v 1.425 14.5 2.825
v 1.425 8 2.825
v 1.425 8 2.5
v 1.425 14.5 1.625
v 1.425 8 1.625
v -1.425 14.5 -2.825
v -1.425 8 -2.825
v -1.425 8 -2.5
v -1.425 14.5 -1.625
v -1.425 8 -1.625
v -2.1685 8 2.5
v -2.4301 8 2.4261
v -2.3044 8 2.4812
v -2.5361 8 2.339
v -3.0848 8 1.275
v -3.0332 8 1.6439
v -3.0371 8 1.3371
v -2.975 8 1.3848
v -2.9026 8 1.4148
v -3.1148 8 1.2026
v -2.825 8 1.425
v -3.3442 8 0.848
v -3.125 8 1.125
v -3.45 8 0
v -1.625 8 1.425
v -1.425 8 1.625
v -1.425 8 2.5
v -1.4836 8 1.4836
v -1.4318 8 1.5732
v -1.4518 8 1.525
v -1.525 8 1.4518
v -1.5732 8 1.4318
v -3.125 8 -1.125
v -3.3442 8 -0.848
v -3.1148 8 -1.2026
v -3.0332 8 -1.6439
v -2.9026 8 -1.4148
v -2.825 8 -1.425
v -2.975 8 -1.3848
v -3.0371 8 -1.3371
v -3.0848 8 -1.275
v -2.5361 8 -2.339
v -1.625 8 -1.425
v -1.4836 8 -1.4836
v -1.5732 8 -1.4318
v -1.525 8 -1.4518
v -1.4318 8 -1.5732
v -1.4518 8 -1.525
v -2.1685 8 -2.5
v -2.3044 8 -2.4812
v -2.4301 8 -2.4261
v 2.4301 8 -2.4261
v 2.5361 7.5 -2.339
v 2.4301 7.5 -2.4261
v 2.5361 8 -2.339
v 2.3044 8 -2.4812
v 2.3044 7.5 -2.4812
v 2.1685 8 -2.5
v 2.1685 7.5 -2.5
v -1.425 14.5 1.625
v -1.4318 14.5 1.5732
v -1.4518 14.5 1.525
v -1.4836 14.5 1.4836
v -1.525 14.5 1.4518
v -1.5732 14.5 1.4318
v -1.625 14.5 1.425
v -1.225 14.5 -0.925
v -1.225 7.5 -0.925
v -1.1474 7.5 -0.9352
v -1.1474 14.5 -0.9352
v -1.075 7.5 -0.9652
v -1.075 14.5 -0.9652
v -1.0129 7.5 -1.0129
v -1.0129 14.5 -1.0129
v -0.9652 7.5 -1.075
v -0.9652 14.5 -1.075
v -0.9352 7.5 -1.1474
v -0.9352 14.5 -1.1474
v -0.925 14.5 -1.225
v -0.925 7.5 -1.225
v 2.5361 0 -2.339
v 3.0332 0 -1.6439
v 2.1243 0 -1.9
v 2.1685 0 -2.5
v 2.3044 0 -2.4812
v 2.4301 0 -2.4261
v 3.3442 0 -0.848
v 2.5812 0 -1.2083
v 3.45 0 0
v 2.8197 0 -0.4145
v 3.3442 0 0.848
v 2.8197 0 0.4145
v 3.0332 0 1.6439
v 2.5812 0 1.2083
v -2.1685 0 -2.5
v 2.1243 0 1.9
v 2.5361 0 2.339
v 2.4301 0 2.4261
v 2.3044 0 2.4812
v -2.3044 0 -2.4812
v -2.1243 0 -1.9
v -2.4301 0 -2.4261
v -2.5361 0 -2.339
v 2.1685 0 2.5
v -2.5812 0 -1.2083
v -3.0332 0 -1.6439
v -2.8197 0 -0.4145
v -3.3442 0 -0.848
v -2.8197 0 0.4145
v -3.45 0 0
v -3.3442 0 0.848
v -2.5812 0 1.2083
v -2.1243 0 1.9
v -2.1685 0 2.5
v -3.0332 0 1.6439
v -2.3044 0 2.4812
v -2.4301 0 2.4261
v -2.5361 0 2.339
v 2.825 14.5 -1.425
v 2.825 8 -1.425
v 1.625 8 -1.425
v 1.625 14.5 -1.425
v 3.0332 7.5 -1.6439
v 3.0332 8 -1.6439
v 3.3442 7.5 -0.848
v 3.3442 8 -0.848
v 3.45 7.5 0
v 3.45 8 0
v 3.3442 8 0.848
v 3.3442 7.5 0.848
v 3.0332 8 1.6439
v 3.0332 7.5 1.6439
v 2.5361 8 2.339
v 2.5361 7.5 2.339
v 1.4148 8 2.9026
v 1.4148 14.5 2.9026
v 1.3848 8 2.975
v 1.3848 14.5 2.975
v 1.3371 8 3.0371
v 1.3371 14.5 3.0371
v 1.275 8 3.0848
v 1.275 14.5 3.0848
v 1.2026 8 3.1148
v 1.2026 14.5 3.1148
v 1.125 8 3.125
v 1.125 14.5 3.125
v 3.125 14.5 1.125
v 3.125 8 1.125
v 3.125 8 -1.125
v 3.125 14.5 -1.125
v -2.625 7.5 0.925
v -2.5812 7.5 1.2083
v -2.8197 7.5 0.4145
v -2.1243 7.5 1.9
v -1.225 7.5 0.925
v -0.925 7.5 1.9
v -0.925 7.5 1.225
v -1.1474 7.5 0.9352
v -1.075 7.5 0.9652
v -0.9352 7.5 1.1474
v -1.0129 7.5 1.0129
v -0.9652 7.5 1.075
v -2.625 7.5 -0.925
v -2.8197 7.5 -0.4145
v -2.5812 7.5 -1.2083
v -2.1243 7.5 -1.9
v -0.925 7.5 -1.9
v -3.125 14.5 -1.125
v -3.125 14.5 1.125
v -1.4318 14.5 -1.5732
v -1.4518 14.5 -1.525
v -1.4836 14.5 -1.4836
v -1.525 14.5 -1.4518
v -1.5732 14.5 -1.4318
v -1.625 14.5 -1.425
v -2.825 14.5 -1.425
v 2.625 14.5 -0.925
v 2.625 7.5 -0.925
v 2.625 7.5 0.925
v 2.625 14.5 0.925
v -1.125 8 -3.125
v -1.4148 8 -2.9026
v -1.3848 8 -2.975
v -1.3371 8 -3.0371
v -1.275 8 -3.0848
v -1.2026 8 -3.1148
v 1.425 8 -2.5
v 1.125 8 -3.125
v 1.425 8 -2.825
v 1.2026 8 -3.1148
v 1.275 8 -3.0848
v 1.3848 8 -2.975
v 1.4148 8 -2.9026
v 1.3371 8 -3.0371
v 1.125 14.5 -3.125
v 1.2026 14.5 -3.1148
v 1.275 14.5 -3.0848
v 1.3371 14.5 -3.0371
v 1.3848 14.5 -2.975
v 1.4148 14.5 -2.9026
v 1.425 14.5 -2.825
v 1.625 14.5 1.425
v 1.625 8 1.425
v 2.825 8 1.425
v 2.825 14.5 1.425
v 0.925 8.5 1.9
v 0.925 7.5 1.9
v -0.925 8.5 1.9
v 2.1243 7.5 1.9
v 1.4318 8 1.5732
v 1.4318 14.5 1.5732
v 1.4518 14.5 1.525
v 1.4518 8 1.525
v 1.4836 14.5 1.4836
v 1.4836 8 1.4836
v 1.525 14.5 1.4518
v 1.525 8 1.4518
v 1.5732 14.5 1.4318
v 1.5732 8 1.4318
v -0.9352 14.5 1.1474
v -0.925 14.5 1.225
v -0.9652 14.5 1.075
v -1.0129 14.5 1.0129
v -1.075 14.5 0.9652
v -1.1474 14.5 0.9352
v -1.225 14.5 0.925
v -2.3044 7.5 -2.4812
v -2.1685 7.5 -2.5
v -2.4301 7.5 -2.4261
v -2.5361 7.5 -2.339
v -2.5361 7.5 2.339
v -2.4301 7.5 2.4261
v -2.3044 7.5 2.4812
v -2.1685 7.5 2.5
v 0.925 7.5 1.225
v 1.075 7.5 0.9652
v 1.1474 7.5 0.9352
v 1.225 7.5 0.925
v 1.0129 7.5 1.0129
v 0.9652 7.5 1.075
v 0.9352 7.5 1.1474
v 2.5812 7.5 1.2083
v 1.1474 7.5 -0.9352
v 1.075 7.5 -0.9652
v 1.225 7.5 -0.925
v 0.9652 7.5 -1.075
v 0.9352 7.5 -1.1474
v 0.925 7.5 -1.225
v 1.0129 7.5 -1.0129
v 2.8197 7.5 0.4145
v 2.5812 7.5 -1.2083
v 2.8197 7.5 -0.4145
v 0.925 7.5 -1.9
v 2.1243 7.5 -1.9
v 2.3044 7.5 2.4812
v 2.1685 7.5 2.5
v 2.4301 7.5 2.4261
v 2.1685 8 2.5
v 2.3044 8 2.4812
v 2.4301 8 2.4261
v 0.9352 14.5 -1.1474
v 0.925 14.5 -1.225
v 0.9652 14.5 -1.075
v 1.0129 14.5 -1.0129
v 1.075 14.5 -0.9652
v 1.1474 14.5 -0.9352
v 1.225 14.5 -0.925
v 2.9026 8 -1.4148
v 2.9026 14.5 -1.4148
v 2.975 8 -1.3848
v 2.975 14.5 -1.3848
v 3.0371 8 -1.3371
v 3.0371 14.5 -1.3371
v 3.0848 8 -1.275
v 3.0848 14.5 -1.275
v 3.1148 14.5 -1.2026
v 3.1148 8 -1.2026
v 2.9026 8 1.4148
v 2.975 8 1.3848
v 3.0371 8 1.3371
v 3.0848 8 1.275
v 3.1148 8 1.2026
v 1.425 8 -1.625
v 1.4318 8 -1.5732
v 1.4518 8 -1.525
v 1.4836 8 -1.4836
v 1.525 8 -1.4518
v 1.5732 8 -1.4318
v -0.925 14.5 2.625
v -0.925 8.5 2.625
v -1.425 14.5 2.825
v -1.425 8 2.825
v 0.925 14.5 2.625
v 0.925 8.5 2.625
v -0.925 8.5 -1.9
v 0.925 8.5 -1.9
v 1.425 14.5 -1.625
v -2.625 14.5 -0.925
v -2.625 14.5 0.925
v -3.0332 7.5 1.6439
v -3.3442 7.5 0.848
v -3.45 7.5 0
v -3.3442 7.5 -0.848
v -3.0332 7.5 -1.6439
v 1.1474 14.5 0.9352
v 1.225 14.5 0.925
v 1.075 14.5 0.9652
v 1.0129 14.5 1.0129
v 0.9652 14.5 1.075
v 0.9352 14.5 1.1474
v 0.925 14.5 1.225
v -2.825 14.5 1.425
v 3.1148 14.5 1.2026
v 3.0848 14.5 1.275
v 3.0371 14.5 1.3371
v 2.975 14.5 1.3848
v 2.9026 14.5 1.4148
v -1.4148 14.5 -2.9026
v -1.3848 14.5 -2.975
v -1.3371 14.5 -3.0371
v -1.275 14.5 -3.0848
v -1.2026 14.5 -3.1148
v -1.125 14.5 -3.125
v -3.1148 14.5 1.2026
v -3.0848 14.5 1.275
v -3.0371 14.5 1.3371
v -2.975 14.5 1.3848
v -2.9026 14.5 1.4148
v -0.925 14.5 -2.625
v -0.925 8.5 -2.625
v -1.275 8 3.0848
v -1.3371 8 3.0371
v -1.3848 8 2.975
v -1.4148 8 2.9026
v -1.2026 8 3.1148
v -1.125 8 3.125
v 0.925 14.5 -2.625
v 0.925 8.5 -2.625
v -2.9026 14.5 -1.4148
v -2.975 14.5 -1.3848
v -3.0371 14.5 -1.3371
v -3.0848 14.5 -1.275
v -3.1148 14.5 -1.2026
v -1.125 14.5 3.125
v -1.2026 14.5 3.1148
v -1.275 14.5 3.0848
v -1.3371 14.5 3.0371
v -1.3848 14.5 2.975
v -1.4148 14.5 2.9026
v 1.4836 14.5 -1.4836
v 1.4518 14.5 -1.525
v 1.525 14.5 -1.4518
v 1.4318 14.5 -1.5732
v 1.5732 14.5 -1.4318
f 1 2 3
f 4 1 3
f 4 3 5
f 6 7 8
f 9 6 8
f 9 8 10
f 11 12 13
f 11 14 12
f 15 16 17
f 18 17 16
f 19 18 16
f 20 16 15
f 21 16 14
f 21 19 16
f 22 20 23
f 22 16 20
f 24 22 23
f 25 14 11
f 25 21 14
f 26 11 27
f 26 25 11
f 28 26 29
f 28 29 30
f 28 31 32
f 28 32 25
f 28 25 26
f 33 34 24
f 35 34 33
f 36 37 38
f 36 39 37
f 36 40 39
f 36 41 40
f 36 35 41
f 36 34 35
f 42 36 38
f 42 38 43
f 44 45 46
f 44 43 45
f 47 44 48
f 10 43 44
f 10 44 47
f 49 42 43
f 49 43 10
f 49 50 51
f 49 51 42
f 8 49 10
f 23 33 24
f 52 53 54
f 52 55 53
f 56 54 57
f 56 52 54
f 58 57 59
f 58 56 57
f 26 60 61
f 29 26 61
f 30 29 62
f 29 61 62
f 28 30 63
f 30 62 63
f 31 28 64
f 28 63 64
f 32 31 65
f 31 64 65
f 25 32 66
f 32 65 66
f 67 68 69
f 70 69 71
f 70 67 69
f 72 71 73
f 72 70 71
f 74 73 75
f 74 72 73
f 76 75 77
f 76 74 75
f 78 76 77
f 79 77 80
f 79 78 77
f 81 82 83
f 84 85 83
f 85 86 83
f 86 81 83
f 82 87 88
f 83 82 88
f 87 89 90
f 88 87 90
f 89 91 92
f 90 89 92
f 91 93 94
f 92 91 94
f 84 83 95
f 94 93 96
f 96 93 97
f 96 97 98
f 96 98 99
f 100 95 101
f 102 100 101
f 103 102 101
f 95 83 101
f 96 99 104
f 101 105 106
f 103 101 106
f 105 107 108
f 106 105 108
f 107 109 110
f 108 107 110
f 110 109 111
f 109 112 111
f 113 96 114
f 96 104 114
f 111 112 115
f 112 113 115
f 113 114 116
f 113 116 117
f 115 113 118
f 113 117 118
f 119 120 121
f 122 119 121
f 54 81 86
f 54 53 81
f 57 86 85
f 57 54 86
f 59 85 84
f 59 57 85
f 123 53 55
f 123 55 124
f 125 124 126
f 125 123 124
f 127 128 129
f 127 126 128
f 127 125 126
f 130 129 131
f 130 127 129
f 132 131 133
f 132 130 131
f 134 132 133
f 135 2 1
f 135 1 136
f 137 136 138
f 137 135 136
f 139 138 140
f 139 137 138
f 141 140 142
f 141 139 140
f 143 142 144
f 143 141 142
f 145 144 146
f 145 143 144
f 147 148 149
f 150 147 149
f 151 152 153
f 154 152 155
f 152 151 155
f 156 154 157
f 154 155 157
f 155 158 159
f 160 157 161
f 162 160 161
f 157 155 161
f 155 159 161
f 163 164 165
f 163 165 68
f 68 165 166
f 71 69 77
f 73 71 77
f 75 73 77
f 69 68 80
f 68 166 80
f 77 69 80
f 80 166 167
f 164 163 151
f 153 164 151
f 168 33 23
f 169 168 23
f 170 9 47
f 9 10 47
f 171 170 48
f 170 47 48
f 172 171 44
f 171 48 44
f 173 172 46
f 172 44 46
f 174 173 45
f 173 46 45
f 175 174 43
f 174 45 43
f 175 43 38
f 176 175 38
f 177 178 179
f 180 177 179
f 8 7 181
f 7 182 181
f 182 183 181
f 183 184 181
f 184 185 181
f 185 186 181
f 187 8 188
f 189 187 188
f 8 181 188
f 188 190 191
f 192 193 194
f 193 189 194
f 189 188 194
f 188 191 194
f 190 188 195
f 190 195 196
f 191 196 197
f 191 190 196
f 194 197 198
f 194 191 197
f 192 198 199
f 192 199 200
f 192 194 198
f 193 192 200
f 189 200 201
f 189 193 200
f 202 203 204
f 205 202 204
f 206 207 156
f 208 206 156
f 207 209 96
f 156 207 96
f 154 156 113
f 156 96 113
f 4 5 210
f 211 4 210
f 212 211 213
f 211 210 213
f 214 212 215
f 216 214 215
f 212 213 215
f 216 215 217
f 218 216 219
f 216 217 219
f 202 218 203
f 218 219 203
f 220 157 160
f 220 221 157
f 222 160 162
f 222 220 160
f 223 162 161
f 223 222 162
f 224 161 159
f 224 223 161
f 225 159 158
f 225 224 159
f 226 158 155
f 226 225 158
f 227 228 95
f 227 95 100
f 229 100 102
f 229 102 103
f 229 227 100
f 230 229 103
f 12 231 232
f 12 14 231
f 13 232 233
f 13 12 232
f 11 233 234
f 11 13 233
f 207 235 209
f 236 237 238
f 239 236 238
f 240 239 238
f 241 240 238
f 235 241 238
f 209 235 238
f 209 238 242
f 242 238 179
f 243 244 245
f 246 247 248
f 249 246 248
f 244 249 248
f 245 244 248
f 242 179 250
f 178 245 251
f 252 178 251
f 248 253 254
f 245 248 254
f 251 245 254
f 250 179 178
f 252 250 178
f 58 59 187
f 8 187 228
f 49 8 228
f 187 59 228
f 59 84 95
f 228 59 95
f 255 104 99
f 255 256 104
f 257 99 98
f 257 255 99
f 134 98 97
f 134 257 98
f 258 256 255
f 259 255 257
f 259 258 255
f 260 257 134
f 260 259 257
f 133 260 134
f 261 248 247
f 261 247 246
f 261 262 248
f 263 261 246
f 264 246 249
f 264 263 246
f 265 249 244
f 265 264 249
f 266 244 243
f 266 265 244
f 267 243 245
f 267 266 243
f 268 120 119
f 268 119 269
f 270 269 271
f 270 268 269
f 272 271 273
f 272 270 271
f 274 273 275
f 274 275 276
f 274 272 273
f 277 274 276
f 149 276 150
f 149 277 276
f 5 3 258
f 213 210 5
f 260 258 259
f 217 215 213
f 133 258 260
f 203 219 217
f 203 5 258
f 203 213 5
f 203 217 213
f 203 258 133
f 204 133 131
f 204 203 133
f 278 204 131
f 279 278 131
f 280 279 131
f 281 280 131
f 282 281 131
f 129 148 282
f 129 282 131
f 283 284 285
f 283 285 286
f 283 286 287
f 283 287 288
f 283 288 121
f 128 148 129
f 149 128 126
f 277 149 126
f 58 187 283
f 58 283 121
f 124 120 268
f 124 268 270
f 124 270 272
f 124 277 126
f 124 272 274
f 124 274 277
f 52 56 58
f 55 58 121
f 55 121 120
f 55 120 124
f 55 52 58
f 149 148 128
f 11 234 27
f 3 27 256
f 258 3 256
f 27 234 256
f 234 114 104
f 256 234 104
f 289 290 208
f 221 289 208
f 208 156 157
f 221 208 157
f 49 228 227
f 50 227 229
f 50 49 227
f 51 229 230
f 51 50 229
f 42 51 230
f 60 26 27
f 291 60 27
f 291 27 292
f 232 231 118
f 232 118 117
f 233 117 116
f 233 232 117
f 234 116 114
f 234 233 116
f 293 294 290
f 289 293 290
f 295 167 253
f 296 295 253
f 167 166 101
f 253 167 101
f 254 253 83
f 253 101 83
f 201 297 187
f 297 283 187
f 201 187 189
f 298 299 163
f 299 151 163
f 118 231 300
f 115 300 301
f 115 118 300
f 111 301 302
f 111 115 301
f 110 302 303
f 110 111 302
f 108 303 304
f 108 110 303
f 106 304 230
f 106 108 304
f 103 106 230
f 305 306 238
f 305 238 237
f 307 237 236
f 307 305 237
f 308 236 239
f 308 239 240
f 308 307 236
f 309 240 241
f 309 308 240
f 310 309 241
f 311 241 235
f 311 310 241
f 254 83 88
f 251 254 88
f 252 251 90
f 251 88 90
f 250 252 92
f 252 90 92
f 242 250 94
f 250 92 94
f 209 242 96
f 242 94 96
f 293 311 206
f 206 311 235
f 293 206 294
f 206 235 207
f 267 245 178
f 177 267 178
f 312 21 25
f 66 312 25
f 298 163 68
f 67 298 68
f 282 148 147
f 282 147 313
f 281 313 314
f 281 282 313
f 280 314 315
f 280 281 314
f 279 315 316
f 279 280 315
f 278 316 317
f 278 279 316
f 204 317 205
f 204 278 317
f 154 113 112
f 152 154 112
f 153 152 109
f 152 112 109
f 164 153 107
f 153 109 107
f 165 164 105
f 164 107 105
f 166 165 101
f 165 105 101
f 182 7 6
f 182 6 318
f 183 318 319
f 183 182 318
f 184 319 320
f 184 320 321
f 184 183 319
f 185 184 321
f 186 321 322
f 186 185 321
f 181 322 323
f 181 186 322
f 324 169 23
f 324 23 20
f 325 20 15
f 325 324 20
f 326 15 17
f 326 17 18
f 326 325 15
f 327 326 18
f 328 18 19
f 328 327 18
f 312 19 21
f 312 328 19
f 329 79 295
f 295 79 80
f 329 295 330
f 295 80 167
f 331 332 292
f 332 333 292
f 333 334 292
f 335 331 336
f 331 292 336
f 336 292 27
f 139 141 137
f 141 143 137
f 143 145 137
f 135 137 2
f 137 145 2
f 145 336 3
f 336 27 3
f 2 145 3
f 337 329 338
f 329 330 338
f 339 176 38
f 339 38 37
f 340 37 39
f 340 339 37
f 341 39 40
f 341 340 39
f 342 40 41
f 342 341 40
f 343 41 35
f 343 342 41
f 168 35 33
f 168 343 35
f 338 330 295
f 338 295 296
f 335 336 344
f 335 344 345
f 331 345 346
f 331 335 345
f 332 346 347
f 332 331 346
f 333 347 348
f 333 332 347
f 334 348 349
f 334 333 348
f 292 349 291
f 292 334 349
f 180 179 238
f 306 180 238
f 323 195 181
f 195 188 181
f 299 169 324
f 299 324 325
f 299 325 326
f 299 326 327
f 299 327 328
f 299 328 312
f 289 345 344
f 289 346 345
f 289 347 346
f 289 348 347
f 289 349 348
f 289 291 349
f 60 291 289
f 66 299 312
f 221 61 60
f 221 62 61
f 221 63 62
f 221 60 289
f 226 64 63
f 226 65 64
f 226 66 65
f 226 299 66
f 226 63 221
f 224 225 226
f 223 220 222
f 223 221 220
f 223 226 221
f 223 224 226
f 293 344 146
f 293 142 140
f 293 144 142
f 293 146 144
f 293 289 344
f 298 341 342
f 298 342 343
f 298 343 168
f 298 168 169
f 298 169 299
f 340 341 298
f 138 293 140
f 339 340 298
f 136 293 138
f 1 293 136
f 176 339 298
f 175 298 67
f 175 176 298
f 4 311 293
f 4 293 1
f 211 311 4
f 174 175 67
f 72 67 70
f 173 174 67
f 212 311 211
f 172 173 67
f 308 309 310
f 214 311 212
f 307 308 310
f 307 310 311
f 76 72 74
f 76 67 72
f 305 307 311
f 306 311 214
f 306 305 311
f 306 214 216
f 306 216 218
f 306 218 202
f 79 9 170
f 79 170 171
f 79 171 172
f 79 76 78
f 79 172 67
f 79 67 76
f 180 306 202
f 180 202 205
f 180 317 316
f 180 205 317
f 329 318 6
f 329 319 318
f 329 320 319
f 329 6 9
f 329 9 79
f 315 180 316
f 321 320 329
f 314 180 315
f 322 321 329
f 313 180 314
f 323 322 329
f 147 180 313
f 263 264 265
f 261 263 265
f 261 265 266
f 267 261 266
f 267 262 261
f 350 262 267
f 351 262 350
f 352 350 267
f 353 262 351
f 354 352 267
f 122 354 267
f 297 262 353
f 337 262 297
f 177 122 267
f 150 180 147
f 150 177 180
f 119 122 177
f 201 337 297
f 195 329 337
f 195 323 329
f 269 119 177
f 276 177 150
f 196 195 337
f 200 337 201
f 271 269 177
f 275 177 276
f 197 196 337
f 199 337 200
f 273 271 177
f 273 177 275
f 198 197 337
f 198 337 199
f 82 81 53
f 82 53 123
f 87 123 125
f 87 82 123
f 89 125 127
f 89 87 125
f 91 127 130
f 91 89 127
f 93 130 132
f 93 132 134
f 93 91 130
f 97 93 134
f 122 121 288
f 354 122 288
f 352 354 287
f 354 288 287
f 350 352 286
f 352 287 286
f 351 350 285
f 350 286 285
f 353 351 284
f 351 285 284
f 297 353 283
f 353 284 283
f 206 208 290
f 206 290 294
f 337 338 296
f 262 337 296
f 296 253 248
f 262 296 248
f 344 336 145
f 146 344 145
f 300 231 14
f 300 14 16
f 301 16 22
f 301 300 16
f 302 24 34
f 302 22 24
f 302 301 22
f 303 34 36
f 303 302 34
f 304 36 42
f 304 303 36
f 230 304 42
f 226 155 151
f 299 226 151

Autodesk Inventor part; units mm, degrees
ref_plane "YZ Plane" through (0, 0, 0) normal (1, 0, 0) x (0, 1, 0)
ref_plane "XZ Plane" through (0, 0, 0) normal (0, 1, 0) x (-1, 0, 0)
ref_plane "XY Plane" through (0, 0, 0) normal (0, 0, 1) x (1, 0, 0)
sketch "Sketch1" plane through (0, 0, 0) normal (0, 1, 0) x (-1, 0, 0)
  line L0 (-2.85, 1.9) -> (2.85, 1.9)
  line L1 (2.85, 1.9) -> (2.85, -1.9)
  line L2 (2.85, -1.9) -> (-2.85, -1.9)
  line L3 (-2.85, -1.9) -> (-2.85, 1.9)
  line L4 (-2.85, 1.9) -> (2.85, -1.9) construction
  line L5 (2.85, 1.9) -> (-2.85, -1.9) construction
  line L6 (3.45, -2.5) -> (3.45, 2.5)
  line L7 (3.45, 2.5) -> (-3.45, 2.5)
  line L8 (-3.45, 2.5) -> (-3.45, -2.5)
  line L9 (-3.45, -2.5) -> (3.45, -2.5)
  circle A0 centre (0, 0) radius 2.85
  circle A1 centre (0, 0) radius 3.45
  point P0 (-2.1243, 1.9)
  point P1 (2.1243, 1.9)
  point P2 (2.1243, -1.9)
  point P3 (-2.1243, -1.9)
  point P4 (-2.3775, 2.5)
  point P5 (-2.3775, -2.5)
  point P6 (2.3775, -2.5)
  point P7 (2.3775, 2.5)
  dimension "d0" = 3.8
  dimension "d1" = 0.6
  dimension "d2" = 5.7
extrude "Extrusion1" add sketch "Sketch1" along normal blind 7.5 contours L3 L2 A0 L9 A1 L7 L0 | L0 A0 L3 | A0 L7 L0 | A0 L2 L3 | A0 L7 A1 L9 L2 L1 L0 | L0 L1 A0 | L2 A0 L9 | L1 L2 A0
sketch "Sketch2" plane through (0, 7.5, 0) normal (0, 1, 0) x (1, 0, 0)
  arc A0 (2.3775, -2.5) -> (2.3775, 2.5) centre (0, 0) ccw projected
  line L0 (2.3775, 2.5) -> (-2.3775, 2.5) projected
  arc A1 (-2.3775, 2.5) -> (-2.3775, -2.5) centre (0, 0) ccw projected
  line L1 (-2.3775, -2.5) -> (2.3775, -2.5) projected
  arc A2 (2.1243, -1.9) -> (2.1243, 1.9) centre (0, 0) ccw projected
  line L2 (2.1243, -1.9) -> (-2.1243, -1.9) projected
  arc A3 (-2.1243, 1.9) -> (-2.1243, -1.9) centre (0, 0) ccw projected
  line L3 (-2.1243, 1.9) -> (2.1243, 1.9) projected
extrude "Extrusion2" add sketch "Sketch2" along normal blind 0.5 contours L1 A1 L0 A0 | L2 A3 L3 A2
sketch "Sketch3" plane through (0, 8, 0) normal (0, 1, 0) x (1, 0, 0)
  line L0 (-0.925, -2.625) -> (-0.925, 2.625)
  line L1 (-0.925, 2.625) -> (0.925, 2.625)
  line L2 (0.925, 2.625) -> (0.925, -2.625)
  line L3 (0.925, -2.625) -> (-0.925, -2.625)
  line L4 (-0.925, -2.625) -> (0.925, 2.625) construction
  line L5 (-0.925, 2.625) -> (0.925, -2.625) construction
  line L6 (-2.625, -0.925) -> (2.625, -0.925)
  line L7 (2.625, -0.925) -> (2.625, 0.925)
  line L8 (2.625, 0.925) -> (-2.625, 0.925)
  line L9 (-2.625, 0.925) -> (-2.625, -0.925)
  line L10 (-2.625, -0.925) -> (2.625, 0.925) construction
  line L11 (2.625, -0.925) -> (-2.625, 0.925) construction
  line L12 (-3.125, 1.425) -> (3.125, 1.425)
  line L13 (3.125, 1.425) -> (3.125, -1.425)
  line L14 (3.125, -1.425) -> (-3.125, -1.425)
  line L15 (-3.125, -1.425) -> (-3.125, 1.425)
  line L16 (1.425, -3.125) -> (1.425, 3.125)
  line L17 (1.425, 3.125) -> (-1.425, 3.125)
  line L18 (-1.425, 3.125) -> (-1.425, -3.125)
  line L19 (-1.425, -3.125) -> (1.425, -3.125)
  point P0 (0, 0)
  point P1 (-1.425, -1.425)
  point P2 (1.425, -1.425)
  point P3 (1.425, 1.425)
  point P4 (-1.425, 1.425)
  dimension "d7" = 5.25
  dimension "d8" = 5.25
  dimension "d9" = 1.85
  dimension "d10" = 1.85
  dimension "d11" = 0.5
  dimension "d12" = 0.5
extrude "Extrusion3" add sketch "Sketch3" along normal blind 0.5
sketch "Sketch4" plane through (0, 8.5, 0) normal (0, 1, 0) x (1, 0, 0)
  line L0 (-3.125, 1.425) -> (-3.125, -1.425) projected
  line L1 (-3.125, -1.425) -> (-1.425, -1.425) projected
  line L2 (-1.425, -1.425) -> (-1.425, -3.125) projected
  line L3 (-1.425, -3.125) -> (1.425, -3.125) projected
  line L4 (1.425, -3.125) -> (1.425, -1.425) projected
  line L5 (1.425, -1.425) -> (3.125, -1.425) projected
  line L6 (3.125, -1.425) -> (3.125, 1.425) projected
  line L7 (3.125, 1.425) -> (1.425, 1.425) projected
  line L8 (1.425, 1.425) -> (1.425, 3.125) projected
  line L9 (1.425, 3.125) -> (-1.425, 3.125) projected
  line L10 (-1.425, 3.125) -> (-1.425, 1.425) projected
  line L11 (-1.425, 1.425) -> (-3.125, 1.425) projected
  line L12 (-2.625, -0.925) -> (-2.625, 0.925)
  line L13 (-2.625, 0.925) -> (-0.925, 0.925)
  line L14 (-0.925, 0.925) -> (-0.925, 2.625)
  line L15 (-0.925, 2.625) -> (0.925, 2.625)
  line L16 (0.925, 2.625) -> (0.925, 0.925)
  line L17 (0.925, 0.925) -> (2.625, 0.925)
  line L18 (2.625, 0.925) -> (2.625, -0.925)
  line L19 (2.625, -0.925) -> (0.925, -0.925)
  line L20 (0.925, -0.925) -> (0.925, -2.625)
  line L21 (0.925, -2.625) -> (-0.925, -2.625)
  line L22 (-0.925, -2.625) -> (-0.925, -0.925)
  line L23 (-0.925, -0.925) -> (-2.625, -0.925)
  point P0 (0, 0)
  dimension "d15" = 0.5
extrude "Extrusion4" add sketch "Sketch4" along normal blind 6
fillet "Fillet1" radius 0.3 8 edges at (1.425, 11.25, 3.125) (3.125, 11.25, 1.425) (3.125, 11.25, -1.425) (1.425, 11.25, -3.125) (-1.425, 11.25, -3.125) (-3.125, 11.25, -1.425) (-1.425, 11.25, 3.125) (-3.125, 11.25, 1.425)
fillet "Fillet2" radius 0.3 4 edges at (-0.925, 11.5, 0.925) (0.925, 11.5, 0.925) (0.925, 11.5, -0.925) (-0.925, 11.5, -0.925)
fillet "Fillet3" radius 0.5 4 edges at (2.3775, 4, -2.5) (-2.3775, 4, -2.5) (-2.3775, 4, 2.5) (2.3775, 4, 2.5)
sketch "Sketch5" plane through (0, 8.5, 0) normal (0, 1, 0) x (1, 0, 0)
  line L0 (2.625, 0.925) -> (1.225, 0.925) projected
  arc A0 (0.925, 1.225) -> (1.225, 0.925) centre (1.225, 1.225) ccw projected
  line L1 (0.925, 1.225) -> (0.925, 2.625) projected
  line L2 (0.925, 2.625) -> (-0.925, 2.625) projected
  line L3 (-0.925, 2.625) -> (-0.925, 1.225) projected
  arc A1 (-1.225, 0.925) -> (-0.925, 1.225) centre (-1.225, 1.225) ccw projected
  line L4 (-1.225, 0.925) -> (-2.625, 0.925) projected
  line L5 (-2.625, 0.925) -> (-2.625, -0.925) projected
  line L6 (-2.625, -0.925) -> (-1.225, -0.925) projected
  arc A2 (-0.925, -1.225) -> (-1.225, -0.925) centre (-1.225, -1.225) ccw projected
  line L7 (-0.925, -1.225) -> (-0.925, -2.625) projected
  line L8 (-0.925, -2.625) -> (0.925, -2.625) projected
  line L9 (0.925, -2.625) -> (0.925, -1.225) projected
  arc A3 (1.225, -0.925) -> (0.925, -1.225) centre (1.225, -1.225) ccw projected
  line L10 (1.225, -0.925) -> (2.625, -0.925) projected
  line L11 (2.625, -0.925) -> (2.625, 0.925) projected
  line L12 (-2.1243, 1.9) -> (2.1243, 1.9) projected
  arc A4 (2.1243, -1.9) -> (2.1243, 1.9) centre (0, 0) ccw projected
  line L13 (2.1243, -1.9) -> (-2.1243, -1.9) projected
  arc A5 (-2.1243, 1.9) -> (-2.1243, -1.9) centre (0, 0) ccw projected
  point P0 (2.5898, -0.925)
  point P1 (2.625, -0.8197)
  point P2 (2.625, 0.8197)
  point P3 (2.5898, 0.925)
  point P4 (0.925, 1.9)
  point P5 (-0.925, 1.9)
  point P6 (-2.5898, 0.925)
  point P7 (-2.625, 0.8197)
  point P8 (-2.625, -0.8197)
  point P9 (-2.5898, -0.925)
  point P10 (-0.925, -1.9)
  point P11 (0.925, -1.9)
extrude "Extrusion5" cut sketch "Sketch5" against normal up to surface (1 mm away) contours L11 L10 A3 L9 L13 L7 A2 L6 L5 L4 A1 L3 L12 L1 A0 L0
fillet "Fillet4" radius 0.2 4 edges at (-1.425, 11.25, 1.425) (1.425, 11.25, 1.425) (1.425, 11.25, -1.425) (-1.425, 11.25, -1.425)
equation "\"d8\" = d7"
equation "\"d10\" = d9"
equation "\"d12\" = d11"
equation "\"d15\" = d11"
properties part number "motor-lego-adapter-3-4"
